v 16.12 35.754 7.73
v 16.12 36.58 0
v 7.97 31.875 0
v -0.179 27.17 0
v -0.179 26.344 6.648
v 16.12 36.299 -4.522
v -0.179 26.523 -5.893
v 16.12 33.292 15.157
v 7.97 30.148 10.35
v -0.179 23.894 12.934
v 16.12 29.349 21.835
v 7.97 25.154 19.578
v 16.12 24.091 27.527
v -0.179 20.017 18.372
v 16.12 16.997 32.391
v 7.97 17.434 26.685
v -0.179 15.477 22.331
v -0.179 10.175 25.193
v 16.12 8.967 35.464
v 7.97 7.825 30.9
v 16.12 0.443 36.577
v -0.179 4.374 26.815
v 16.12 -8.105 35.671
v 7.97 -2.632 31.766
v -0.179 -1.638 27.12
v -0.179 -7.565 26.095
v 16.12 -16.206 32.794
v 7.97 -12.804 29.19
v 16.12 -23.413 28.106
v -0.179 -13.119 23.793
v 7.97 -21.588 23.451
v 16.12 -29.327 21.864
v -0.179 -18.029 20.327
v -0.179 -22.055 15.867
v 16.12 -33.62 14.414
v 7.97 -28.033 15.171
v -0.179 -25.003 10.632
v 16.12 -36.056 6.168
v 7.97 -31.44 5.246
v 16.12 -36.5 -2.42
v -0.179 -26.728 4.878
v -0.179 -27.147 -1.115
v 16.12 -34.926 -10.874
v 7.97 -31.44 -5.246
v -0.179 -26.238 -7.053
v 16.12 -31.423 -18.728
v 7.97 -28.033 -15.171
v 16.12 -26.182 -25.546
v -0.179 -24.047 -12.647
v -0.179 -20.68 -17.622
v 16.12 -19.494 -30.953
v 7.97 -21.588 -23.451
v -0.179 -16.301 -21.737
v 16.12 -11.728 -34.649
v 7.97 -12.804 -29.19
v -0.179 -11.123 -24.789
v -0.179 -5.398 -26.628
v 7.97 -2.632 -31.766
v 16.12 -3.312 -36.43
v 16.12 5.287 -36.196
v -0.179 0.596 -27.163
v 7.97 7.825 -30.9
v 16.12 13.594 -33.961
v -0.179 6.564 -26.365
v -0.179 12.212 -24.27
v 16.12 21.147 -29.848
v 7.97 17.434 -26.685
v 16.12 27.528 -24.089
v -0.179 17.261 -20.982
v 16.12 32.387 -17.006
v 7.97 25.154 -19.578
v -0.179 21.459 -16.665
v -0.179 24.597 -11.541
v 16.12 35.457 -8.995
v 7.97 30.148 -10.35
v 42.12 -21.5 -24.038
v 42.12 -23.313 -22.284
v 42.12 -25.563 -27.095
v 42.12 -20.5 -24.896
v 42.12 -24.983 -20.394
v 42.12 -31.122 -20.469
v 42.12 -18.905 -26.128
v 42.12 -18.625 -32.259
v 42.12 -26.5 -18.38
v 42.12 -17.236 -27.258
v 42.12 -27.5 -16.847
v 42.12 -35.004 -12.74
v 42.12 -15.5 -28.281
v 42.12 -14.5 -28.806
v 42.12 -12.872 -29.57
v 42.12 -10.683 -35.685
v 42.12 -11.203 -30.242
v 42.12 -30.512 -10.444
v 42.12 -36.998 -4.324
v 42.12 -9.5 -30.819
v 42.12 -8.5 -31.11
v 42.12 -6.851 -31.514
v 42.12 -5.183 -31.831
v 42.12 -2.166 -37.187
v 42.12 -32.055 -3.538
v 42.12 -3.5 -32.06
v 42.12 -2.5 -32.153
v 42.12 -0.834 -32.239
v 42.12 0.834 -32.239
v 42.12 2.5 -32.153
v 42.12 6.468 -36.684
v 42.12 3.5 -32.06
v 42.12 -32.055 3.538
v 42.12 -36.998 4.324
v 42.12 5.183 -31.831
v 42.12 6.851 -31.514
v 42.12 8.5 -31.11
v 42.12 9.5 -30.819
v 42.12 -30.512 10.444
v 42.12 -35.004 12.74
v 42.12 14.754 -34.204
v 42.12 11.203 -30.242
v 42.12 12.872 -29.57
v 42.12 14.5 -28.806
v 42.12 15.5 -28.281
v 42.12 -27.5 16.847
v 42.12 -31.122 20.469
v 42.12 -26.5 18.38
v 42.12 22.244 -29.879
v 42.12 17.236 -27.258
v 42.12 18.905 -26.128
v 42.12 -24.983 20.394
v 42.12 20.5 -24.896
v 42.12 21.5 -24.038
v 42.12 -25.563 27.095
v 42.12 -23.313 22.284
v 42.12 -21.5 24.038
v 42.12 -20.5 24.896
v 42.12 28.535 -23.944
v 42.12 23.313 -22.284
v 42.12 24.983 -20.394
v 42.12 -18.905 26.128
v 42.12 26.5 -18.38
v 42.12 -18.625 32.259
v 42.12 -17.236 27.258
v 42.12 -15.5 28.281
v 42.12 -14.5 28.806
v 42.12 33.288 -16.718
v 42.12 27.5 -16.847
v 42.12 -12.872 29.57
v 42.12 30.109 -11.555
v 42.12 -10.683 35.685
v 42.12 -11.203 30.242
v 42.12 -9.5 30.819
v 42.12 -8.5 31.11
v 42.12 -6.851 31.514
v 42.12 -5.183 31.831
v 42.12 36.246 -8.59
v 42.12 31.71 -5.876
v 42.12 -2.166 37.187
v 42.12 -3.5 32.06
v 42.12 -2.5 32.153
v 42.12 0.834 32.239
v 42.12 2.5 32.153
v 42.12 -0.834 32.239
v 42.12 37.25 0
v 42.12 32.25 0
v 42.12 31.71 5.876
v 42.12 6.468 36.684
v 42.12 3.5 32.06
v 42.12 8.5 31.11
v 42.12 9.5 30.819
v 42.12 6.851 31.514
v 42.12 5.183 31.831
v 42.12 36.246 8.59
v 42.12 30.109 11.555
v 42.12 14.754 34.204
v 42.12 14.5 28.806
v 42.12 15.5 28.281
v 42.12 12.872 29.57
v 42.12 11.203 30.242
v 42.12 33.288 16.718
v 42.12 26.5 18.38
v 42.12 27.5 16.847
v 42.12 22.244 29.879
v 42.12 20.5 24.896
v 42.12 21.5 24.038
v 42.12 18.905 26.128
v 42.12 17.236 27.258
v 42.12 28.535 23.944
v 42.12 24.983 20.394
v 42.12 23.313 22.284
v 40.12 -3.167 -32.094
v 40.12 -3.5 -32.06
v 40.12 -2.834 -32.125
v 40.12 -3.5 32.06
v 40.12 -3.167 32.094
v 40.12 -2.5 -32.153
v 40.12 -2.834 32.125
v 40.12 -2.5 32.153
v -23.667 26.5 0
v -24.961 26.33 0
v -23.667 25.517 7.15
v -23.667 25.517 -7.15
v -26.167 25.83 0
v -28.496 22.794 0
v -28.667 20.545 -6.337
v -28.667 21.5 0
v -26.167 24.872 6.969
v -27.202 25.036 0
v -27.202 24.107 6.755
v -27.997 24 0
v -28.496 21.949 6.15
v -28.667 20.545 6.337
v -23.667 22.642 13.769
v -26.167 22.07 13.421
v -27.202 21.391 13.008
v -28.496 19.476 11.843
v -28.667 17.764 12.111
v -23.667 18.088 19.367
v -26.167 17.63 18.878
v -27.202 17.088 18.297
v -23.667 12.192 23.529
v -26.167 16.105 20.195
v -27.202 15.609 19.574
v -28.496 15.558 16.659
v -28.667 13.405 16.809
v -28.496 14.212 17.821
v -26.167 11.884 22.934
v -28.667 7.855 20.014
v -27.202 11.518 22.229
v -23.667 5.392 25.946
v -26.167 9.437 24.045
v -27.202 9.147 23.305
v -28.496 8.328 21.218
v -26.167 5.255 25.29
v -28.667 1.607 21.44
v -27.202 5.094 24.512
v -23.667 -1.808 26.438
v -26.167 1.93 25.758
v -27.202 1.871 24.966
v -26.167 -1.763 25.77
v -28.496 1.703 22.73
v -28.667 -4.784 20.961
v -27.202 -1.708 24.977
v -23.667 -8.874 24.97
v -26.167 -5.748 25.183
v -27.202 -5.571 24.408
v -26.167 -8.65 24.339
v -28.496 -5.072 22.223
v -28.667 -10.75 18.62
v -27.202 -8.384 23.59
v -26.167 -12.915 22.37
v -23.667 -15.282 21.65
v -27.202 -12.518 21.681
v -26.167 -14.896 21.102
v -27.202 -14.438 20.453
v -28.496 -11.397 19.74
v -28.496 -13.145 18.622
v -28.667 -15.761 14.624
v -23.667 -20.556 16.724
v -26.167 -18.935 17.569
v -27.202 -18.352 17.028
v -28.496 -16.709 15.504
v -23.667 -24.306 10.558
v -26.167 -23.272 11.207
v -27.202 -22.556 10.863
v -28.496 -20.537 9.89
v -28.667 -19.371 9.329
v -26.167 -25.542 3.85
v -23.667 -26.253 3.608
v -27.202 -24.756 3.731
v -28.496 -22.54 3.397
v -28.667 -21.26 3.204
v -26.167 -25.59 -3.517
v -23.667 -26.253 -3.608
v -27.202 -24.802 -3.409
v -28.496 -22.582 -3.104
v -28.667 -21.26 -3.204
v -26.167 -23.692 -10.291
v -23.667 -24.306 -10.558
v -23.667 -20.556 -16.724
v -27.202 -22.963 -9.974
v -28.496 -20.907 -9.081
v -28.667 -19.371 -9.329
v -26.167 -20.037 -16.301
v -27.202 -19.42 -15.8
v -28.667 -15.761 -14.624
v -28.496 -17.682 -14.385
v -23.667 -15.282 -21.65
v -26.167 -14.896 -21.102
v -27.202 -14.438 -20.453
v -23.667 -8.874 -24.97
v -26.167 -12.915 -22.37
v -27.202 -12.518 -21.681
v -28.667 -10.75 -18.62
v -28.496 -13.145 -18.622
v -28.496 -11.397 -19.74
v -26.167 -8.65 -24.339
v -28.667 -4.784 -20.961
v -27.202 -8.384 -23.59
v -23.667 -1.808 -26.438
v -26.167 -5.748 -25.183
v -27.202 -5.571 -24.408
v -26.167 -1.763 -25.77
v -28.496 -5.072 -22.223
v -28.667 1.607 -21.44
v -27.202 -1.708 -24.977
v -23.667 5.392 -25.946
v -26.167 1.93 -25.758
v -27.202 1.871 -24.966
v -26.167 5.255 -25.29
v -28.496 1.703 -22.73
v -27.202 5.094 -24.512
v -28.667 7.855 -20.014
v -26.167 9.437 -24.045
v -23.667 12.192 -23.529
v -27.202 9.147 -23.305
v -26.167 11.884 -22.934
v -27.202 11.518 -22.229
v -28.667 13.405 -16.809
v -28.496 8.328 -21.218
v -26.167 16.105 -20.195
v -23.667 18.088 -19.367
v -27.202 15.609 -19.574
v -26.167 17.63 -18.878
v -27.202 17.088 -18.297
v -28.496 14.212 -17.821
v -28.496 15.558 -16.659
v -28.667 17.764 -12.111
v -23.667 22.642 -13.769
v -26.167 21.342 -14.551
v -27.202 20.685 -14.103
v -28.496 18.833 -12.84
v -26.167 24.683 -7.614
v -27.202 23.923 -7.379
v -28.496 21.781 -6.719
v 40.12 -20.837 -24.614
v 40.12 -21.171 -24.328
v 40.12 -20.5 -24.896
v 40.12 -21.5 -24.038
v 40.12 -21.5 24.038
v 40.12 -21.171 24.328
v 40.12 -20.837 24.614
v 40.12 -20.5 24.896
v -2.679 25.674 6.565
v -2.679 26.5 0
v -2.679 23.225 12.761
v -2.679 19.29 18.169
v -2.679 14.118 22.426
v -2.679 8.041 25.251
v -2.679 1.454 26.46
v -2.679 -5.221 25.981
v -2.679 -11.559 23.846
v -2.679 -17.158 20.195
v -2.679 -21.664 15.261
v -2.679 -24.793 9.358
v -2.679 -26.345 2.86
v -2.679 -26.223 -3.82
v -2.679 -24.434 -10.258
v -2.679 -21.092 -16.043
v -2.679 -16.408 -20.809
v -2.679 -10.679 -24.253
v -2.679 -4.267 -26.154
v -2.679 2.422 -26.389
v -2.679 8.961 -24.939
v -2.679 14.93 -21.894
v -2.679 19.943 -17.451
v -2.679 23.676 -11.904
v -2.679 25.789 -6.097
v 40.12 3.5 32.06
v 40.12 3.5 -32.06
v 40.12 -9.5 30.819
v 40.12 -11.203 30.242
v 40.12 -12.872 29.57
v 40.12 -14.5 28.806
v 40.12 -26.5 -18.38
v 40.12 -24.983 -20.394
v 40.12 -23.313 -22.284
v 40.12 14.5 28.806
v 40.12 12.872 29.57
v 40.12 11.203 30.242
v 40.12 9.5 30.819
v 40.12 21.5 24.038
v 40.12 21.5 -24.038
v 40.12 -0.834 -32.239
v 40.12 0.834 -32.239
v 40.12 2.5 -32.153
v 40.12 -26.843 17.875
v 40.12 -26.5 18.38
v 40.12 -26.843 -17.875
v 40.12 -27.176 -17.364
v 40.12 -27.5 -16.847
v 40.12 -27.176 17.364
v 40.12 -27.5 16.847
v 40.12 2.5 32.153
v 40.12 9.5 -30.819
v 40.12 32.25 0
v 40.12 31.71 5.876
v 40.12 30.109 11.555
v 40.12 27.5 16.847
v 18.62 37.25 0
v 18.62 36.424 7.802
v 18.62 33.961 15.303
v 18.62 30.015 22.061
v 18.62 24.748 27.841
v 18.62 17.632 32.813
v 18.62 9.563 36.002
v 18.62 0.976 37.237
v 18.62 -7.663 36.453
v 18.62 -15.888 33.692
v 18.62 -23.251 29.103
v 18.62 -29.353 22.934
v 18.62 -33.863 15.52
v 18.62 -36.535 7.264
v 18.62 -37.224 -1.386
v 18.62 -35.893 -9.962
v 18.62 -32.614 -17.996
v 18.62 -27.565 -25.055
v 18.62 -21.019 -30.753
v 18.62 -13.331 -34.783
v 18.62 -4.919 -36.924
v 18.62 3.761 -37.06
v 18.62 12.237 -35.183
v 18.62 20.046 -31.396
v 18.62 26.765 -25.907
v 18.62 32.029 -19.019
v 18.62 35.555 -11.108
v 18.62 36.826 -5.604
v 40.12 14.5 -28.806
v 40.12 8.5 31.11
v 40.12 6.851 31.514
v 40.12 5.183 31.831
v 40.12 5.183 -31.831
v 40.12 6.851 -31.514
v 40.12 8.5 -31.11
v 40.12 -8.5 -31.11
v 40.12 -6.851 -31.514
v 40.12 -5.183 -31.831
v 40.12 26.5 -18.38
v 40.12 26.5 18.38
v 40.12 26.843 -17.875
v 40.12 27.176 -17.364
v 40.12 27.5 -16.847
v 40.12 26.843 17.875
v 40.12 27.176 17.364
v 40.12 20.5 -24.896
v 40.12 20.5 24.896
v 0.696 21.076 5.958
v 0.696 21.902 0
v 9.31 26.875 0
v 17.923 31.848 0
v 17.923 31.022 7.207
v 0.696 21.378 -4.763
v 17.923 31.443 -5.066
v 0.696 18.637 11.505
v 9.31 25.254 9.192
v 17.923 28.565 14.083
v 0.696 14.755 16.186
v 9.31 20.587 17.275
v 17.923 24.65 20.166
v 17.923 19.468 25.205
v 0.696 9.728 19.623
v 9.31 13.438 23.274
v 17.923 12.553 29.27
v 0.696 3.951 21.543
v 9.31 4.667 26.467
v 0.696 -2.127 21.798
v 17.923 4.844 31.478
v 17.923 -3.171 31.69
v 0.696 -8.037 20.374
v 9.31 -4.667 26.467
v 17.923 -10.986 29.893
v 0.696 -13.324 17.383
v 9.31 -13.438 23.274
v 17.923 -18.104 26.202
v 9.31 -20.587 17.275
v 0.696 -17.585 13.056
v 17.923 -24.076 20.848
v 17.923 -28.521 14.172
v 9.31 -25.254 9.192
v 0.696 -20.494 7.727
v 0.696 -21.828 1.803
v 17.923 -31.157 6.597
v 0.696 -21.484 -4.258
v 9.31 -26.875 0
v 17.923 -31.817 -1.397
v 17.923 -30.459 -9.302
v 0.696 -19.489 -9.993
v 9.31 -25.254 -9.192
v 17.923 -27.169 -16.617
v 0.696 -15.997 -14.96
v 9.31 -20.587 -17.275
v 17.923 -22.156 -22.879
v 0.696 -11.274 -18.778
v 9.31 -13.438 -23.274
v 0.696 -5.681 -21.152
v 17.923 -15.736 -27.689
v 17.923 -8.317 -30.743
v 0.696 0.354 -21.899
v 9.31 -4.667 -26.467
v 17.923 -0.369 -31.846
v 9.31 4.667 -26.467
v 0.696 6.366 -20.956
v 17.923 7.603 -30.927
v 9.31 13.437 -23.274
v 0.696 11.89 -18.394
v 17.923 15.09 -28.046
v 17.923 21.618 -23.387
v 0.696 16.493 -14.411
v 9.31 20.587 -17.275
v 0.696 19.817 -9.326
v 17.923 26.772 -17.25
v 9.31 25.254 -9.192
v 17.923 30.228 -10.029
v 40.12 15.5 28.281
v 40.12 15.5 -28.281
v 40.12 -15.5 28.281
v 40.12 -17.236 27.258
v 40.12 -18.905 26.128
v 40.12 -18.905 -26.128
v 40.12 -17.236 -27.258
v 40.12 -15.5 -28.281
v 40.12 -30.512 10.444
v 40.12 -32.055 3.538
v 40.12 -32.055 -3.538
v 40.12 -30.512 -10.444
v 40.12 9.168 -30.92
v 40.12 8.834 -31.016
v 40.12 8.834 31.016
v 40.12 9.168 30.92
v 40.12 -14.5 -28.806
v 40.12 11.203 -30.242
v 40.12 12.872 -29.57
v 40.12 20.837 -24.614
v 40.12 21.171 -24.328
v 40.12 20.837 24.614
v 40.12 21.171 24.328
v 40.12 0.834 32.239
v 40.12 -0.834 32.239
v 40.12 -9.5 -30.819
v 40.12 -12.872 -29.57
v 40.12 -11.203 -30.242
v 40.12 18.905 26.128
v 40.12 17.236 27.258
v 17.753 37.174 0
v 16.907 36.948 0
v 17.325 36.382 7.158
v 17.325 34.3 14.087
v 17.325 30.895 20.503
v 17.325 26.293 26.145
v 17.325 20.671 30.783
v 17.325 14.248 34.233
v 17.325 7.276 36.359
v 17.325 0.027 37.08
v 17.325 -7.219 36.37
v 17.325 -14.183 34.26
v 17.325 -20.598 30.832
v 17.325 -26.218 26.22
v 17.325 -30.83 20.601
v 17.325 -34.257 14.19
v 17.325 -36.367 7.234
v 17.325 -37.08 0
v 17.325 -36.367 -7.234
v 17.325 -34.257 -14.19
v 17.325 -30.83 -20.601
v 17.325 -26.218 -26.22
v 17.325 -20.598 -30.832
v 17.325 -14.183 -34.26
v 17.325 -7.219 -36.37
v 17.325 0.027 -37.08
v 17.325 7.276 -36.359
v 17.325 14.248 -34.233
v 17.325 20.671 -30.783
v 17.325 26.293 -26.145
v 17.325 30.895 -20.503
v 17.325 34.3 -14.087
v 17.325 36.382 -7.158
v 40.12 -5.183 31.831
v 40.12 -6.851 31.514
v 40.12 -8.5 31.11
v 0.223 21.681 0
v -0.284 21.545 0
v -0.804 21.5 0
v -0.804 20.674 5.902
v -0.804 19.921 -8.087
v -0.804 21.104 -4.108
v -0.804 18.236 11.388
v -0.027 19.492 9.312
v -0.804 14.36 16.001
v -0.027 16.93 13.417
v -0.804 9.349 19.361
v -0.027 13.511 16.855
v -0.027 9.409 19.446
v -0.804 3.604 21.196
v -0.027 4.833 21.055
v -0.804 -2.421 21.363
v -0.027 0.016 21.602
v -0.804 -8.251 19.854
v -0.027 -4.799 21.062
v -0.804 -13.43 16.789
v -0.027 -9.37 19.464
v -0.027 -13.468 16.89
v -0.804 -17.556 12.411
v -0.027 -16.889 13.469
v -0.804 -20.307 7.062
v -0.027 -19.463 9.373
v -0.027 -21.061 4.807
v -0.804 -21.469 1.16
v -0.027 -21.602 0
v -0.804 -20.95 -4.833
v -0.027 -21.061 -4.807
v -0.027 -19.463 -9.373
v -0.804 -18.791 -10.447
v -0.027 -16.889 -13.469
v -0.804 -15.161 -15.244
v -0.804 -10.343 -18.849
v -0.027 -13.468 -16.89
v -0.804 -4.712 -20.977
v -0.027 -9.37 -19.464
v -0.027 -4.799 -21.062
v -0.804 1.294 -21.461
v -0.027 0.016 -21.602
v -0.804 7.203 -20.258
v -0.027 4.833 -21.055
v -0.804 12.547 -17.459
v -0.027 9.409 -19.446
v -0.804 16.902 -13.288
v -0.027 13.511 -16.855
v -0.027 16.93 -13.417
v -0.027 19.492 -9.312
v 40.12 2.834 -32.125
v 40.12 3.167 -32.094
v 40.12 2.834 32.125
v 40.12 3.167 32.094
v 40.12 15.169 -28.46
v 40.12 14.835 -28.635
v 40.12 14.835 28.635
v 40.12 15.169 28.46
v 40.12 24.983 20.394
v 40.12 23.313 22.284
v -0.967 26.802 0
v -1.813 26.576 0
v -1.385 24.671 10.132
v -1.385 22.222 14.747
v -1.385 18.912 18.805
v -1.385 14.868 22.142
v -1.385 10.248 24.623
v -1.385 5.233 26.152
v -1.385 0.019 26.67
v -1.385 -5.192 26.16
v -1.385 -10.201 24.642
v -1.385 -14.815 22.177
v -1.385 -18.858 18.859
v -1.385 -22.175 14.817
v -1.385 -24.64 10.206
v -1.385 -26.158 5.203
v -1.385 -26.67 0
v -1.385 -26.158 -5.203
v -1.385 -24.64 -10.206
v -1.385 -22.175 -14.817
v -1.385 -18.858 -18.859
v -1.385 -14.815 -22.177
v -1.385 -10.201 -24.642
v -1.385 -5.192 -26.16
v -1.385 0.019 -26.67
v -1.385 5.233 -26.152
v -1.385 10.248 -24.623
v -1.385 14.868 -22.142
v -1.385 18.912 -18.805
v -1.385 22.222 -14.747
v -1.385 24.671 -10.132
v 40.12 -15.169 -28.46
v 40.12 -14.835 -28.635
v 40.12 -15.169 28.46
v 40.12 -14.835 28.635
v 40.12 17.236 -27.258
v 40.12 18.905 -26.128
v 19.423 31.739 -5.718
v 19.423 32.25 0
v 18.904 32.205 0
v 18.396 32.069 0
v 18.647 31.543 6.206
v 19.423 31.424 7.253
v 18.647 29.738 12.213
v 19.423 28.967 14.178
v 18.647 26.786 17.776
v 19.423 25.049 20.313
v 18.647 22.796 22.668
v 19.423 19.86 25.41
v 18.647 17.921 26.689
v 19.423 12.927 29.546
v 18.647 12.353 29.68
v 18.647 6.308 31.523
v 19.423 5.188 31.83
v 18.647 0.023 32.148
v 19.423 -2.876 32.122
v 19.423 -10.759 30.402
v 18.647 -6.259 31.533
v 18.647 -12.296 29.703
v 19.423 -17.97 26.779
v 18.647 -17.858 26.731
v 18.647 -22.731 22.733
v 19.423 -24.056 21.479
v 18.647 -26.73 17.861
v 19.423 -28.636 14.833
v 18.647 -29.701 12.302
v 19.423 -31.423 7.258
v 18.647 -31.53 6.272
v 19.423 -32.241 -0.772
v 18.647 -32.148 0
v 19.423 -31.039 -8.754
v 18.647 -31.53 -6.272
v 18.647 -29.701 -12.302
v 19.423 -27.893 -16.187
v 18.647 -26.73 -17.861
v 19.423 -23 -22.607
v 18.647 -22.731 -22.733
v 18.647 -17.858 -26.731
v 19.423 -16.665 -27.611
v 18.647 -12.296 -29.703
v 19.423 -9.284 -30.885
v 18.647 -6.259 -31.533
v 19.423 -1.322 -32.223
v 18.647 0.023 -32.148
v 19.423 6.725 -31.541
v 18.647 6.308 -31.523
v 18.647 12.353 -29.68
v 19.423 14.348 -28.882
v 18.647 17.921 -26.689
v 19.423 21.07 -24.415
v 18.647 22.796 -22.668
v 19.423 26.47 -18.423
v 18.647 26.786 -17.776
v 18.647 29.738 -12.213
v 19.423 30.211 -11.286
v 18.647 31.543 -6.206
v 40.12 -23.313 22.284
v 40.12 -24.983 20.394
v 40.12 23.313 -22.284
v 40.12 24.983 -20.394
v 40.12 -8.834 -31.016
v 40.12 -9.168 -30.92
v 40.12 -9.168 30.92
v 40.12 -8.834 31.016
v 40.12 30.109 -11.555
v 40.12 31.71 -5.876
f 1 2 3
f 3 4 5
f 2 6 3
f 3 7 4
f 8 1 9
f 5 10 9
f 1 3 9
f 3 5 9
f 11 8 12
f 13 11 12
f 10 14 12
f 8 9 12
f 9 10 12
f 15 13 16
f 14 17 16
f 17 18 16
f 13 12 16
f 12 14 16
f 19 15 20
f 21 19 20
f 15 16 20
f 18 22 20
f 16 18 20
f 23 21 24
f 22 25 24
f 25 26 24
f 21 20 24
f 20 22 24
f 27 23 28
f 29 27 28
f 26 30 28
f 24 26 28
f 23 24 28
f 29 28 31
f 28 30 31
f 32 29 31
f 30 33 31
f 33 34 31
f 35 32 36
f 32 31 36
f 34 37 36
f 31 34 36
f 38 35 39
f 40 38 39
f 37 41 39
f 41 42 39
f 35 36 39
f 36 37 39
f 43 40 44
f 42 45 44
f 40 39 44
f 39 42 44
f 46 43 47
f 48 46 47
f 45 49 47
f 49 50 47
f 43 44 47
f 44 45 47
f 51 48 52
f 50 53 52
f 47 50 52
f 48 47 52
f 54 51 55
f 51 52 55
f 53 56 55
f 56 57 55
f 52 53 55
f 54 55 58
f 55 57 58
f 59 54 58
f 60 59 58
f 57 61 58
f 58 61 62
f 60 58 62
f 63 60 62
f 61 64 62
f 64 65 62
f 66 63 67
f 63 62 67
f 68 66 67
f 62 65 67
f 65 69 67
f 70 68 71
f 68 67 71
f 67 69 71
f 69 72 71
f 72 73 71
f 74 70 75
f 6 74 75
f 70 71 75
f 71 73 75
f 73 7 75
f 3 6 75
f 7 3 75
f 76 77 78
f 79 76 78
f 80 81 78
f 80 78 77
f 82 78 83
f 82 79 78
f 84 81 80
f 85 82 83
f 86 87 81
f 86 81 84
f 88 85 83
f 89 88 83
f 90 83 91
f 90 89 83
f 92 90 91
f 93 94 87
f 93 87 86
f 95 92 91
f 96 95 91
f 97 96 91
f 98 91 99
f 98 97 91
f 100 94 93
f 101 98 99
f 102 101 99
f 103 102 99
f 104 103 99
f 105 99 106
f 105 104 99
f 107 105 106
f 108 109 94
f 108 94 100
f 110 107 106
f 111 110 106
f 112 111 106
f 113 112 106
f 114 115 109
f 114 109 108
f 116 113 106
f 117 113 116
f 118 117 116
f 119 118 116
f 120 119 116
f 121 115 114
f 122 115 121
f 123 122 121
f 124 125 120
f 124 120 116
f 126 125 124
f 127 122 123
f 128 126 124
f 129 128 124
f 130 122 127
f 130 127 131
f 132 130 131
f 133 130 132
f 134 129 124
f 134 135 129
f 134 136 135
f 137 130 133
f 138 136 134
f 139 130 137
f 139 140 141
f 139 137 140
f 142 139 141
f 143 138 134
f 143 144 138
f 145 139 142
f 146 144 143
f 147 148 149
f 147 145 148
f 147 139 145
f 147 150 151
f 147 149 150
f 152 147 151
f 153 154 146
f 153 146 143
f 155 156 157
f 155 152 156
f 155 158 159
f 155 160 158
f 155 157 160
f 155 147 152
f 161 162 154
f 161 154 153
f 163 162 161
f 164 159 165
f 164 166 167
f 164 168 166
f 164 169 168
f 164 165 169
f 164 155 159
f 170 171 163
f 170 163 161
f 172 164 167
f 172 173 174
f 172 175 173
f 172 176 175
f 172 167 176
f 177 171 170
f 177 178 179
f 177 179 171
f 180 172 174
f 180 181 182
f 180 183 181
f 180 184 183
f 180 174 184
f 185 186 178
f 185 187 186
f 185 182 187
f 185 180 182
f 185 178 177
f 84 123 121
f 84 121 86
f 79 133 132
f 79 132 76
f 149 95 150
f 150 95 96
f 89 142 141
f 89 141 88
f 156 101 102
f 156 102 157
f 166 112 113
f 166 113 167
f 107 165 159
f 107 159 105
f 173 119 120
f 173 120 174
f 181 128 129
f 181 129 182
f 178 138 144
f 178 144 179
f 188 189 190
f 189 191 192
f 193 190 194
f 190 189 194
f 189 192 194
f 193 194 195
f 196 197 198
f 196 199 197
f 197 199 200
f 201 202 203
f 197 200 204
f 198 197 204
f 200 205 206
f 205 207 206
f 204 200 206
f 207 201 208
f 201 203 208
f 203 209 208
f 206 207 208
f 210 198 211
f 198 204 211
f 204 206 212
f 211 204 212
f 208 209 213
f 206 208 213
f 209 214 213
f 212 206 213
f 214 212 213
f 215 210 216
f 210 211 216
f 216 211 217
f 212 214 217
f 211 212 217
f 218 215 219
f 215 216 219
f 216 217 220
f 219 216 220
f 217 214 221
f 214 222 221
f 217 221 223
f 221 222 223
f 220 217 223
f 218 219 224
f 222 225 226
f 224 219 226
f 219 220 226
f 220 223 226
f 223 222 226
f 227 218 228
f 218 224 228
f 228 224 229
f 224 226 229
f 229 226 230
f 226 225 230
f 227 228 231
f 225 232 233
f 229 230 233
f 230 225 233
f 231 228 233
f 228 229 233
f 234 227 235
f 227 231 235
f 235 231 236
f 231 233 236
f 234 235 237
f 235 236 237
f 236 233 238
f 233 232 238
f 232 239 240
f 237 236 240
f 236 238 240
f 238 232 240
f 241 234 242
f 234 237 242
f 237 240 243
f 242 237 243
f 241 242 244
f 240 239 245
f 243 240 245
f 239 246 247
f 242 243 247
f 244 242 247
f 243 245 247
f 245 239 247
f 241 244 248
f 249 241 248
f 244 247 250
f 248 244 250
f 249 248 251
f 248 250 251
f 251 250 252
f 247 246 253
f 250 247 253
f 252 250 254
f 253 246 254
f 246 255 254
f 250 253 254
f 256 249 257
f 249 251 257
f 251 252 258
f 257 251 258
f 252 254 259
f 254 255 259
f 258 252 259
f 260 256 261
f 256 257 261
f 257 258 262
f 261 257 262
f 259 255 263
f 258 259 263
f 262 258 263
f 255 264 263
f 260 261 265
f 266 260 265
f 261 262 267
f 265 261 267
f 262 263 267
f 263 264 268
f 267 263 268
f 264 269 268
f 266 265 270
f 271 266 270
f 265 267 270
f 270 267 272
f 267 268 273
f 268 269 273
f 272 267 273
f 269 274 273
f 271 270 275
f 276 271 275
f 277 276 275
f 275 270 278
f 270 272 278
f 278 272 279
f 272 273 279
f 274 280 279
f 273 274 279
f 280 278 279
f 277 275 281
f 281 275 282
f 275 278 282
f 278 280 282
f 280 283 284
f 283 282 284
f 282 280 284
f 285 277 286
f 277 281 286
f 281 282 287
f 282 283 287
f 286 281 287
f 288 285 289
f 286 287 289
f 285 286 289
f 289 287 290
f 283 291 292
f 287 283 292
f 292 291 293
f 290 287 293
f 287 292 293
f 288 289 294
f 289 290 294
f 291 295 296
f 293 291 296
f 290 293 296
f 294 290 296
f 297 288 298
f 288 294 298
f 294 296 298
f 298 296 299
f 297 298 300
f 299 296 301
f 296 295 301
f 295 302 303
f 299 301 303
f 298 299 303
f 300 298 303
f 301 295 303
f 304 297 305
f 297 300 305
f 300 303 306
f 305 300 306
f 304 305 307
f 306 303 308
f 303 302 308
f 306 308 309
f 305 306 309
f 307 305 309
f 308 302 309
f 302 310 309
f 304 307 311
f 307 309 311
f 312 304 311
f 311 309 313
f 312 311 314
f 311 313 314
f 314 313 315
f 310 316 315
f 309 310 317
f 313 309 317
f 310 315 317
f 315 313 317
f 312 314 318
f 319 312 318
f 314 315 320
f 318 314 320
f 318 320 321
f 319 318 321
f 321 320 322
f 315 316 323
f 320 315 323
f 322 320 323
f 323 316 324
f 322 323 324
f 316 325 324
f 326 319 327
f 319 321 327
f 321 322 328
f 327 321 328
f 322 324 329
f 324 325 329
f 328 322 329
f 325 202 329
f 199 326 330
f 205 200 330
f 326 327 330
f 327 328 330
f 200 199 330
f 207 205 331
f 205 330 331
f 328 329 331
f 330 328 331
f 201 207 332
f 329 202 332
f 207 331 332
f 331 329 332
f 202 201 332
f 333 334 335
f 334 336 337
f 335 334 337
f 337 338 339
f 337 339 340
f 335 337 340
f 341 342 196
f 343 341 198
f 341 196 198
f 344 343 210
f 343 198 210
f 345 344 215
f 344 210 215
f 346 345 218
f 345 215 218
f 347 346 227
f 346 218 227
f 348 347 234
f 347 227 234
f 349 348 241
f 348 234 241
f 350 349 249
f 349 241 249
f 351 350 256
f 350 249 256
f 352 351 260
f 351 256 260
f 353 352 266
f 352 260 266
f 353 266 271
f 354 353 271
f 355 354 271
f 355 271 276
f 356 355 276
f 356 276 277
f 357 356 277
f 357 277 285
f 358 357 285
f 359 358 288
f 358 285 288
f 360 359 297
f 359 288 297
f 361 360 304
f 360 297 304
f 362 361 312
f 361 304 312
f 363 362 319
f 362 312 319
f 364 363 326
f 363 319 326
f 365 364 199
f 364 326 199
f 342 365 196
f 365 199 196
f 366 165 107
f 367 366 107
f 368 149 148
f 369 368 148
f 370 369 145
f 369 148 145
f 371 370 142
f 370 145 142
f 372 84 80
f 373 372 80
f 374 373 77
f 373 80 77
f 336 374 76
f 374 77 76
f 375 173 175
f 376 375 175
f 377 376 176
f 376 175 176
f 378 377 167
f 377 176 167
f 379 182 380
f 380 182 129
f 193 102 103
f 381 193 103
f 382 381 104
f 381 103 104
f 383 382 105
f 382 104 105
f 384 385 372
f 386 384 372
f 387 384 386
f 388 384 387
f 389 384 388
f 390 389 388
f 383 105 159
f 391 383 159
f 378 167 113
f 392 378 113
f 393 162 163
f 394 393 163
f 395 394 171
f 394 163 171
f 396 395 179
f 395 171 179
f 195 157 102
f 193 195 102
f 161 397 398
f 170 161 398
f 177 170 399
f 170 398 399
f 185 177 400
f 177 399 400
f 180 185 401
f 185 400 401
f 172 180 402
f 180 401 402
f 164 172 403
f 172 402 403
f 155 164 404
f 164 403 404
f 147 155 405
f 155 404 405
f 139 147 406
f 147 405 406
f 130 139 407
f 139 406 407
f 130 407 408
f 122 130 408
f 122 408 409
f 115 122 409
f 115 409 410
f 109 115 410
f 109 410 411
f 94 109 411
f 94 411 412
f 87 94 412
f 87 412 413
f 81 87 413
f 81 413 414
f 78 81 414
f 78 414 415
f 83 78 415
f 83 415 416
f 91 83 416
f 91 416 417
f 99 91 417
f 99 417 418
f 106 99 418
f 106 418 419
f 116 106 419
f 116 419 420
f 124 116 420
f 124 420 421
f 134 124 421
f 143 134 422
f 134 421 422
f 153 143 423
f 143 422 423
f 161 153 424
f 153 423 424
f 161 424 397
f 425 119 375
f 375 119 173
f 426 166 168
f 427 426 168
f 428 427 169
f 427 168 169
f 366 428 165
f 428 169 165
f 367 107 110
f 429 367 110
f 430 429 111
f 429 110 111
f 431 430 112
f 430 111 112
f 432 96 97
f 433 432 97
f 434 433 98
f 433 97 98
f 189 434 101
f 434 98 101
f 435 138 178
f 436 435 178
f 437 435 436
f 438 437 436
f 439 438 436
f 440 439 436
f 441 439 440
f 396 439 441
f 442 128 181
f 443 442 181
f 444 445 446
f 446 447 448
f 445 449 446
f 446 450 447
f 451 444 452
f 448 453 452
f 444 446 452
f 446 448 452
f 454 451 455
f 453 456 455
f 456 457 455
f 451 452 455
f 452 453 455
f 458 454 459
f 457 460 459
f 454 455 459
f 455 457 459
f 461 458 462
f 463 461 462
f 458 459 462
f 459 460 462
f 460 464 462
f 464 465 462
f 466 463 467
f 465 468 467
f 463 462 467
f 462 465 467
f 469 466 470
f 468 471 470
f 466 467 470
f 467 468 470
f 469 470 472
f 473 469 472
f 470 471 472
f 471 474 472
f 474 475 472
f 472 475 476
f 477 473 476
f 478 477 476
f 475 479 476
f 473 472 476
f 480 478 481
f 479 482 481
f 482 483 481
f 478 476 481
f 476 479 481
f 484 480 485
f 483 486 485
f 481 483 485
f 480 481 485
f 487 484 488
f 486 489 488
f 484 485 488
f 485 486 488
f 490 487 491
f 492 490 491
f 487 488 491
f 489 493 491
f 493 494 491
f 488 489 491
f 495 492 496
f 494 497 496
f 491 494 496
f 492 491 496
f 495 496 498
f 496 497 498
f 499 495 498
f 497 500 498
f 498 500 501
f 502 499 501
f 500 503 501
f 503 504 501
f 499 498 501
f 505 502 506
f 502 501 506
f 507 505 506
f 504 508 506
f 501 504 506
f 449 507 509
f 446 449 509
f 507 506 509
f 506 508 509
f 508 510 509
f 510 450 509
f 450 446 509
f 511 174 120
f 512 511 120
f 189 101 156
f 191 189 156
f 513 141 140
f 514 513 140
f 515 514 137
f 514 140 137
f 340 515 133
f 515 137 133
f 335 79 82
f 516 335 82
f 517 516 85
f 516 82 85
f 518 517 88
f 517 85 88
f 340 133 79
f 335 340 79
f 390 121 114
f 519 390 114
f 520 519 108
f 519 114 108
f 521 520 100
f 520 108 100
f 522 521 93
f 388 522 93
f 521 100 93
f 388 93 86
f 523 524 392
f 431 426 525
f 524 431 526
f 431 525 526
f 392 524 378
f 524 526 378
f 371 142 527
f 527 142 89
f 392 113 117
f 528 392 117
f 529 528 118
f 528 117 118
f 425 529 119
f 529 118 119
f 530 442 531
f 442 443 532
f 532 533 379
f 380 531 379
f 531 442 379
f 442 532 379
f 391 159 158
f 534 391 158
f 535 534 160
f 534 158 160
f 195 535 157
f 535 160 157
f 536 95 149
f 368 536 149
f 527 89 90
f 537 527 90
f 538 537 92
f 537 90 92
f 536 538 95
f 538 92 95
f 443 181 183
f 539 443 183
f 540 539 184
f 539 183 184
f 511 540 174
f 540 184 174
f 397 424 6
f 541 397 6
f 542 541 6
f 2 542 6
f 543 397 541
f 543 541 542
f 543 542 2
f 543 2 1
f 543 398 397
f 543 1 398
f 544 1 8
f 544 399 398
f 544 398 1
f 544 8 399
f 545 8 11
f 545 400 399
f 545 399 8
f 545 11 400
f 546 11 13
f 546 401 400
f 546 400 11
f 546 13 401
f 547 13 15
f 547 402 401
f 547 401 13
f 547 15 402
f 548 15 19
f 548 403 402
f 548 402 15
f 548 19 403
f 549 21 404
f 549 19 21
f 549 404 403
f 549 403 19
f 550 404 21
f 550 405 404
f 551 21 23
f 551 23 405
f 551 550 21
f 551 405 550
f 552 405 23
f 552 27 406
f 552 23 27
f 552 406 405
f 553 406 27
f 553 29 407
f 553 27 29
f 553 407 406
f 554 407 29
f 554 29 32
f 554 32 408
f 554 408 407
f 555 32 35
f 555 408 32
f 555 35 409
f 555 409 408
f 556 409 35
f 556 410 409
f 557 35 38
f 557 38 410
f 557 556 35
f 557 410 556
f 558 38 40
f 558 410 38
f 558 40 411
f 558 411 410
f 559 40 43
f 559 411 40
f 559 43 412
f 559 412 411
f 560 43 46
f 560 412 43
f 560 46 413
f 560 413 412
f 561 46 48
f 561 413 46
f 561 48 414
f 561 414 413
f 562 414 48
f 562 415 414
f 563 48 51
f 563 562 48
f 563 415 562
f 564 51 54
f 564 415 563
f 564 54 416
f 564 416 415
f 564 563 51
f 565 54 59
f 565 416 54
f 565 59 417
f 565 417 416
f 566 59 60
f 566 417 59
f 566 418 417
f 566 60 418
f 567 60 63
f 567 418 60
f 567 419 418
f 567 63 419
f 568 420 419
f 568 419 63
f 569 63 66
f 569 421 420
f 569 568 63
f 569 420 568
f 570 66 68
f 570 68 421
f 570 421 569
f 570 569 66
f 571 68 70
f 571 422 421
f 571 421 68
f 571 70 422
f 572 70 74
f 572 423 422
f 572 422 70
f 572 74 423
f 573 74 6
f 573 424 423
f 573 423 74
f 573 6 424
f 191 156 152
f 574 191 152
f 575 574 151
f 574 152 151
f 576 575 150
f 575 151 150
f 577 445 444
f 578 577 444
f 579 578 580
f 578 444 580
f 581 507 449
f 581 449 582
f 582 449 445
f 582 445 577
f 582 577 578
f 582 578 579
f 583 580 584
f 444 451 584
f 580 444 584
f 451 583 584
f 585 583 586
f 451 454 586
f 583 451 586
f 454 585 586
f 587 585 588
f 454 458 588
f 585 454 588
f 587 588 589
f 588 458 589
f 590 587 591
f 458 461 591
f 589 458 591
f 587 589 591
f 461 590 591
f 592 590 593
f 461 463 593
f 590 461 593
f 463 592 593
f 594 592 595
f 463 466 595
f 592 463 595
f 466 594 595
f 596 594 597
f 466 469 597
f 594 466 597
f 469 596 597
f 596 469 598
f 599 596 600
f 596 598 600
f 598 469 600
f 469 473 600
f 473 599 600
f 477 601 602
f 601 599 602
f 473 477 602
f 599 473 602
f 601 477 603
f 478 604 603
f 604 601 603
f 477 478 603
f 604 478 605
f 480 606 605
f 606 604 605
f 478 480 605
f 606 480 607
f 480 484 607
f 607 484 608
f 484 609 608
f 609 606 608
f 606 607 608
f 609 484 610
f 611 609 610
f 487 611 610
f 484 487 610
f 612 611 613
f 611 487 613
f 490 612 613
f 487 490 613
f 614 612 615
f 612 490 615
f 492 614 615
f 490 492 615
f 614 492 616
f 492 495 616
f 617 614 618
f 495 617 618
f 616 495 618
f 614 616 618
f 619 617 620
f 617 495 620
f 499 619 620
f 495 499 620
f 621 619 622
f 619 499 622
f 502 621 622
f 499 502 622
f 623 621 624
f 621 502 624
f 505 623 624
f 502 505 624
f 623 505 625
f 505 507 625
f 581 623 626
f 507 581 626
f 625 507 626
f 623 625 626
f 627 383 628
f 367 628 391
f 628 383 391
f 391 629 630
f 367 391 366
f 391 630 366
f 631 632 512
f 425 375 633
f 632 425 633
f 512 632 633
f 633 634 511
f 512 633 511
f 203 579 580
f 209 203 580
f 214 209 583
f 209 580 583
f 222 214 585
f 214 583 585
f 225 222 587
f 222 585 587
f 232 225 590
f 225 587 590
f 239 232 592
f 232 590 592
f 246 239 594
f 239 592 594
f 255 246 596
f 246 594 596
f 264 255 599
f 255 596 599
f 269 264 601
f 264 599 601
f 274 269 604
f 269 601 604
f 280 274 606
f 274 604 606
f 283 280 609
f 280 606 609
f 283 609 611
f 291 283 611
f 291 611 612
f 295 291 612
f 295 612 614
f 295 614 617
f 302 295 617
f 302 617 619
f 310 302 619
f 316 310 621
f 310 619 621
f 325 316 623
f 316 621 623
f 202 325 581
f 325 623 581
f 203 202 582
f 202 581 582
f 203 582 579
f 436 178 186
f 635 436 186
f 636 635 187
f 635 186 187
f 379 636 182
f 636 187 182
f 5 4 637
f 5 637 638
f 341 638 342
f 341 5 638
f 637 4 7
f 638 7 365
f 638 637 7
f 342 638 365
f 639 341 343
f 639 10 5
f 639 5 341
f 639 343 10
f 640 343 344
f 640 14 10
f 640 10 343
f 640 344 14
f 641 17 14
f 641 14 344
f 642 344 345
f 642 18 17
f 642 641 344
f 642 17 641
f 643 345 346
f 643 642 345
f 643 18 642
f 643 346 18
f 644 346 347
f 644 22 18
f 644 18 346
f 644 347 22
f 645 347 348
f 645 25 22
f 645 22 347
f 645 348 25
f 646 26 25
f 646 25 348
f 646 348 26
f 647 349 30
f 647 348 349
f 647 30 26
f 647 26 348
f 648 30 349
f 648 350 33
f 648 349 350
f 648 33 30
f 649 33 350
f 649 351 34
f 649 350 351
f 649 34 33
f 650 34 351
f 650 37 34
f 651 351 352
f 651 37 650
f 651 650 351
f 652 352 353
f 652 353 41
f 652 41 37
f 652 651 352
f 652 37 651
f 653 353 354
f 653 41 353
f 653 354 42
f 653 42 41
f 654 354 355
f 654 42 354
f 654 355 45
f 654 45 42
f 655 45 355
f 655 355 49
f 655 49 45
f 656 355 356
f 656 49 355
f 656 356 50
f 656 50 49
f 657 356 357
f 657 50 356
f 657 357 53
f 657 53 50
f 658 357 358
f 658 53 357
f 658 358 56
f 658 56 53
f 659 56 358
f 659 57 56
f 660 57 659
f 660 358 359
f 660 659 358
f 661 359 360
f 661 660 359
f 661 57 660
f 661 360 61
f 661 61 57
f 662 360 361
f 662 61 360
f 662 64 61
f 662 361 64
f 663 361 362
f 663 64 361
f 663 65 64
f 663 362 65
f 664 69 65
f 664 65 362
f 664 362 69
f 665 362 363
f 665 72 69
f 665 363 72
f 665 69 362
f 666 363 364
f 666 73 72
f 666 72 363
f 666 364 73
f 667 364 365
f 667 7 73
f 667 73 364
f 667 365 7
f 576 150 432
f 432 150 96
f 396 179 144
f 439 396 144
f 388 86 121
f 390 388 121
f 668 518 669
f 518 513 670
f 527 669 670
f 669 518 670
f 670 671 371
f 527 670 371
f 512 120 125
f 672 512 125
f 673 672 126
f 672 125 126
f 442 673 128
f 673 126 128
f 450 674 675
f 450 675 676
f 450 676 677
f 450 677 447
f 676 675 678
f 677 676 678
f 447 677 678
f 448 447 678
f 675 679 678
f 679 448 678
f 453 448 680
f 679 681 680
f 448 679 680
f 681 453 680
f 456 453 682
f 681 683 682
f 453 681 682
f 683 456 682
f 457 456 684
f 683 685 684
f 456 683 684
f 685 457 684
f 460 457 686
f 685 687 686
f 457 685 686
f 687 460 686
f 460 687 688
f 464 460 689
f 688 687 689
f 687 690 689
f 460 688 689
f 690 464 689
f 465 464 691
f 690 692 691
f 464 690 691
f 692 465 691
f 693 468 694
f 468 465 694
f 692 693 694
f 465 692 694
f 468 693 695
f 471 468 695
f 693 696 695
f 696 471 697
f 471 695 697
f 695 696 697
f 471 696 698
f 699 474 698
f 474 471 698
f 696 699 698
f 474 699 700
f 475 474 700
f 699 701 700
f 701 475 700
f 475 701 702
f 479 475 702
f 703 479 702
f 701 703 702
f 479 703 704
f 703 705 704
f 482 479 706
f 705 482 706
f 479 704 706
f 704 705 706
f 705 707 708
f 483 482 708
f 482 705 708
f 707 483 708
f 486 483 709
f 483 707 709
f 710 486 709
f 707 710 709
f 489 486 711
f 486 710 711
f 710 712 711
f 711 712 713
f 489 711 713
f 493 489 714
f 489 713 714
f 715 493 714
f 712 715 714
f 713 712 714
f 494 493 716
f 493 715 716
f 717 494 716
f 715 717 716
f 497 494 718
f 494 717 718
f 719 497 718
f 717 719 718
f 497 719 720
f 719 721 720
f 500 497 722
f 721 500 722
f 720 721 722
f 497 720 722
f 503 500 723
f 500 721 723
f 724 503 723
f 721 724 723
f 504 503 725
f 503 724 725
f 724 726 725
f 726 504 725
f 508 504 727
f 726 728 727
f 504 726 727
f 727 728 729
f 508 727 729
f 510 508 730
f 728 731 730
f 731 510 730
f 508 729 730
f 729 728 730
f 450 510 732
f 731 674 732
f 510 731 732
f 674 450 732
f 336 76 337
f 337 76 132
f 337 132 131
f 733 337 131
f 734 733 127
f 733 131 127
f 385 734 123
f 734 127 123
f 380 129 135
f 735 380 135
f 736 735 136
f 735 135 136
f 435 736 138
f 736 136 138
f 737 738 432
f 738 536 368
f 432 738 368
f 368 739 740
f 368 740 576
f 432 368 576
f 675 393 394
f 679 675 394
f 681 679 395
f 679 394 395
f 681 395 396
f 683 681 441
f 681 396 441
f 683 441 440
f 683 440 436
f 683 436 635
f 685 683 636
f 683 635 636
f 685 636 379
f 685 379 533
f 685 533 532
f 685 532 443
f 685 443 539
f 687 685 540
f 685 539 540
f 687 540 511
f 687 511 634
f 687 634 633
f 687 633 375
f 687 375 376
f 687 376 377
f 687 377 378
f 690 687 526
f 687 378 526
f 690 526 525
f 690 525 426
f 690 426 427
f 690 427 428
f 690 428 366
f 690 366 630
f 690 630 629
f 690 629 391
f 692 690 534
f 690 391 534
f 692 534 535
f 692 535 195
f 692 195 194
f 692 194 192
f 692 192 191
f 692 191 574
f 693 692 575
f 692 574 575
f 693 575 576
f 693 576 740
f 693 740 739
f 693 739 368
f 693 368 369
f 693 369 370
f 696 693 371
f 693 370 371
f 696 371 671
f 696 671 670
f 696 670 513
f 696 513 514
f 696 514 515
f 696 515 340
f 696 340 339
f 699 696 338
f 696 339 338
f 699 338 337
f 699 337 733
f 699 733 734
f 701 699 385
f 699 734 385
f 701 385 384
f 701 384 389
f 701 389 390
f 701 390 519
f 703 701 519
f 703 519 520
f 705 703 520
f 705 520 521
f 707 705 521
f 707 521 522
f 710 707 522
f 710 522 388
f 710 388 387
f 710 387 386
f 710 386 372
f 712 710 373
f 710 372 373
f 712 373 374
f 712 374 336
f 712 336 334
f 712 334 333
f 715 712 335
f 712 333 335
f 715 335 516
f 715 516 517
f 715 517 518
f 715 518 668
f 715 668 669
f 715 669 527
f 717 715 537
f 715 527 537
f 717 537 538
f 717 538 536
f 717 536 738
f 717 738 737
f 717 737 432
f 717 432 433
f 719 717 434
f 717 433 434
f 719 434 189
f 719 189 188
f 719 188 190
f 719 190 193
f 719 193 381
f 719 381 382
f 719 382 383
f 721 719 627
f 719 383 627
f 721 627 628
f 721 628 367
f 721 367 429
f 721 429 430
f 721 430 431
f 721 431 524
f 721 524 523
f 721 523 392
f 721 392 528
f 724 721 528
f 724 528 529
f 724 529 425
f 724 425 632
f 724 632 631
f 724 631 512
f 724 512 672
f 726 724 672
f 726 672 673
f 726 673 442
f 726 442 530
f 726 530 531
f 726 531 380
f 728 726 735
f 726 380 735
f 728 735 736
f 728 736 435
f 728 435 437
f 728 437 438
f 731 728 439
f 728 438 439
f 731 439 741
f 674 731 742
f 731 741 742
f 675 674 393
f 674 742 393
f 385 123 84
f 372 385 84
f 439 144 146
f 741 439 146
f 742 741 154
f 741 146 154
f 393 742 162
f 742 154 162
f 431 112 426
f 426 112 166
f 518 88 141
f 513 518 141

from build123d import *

# Parameters (mm, degrees)
F2_R     = 37.25
F3_DEPTH = 2
F5_DEPTH = 2
F6_R     = 4.99999
F7_R     = 3


# Not quite as in the source:
# - a fillet or chamfer is up to 0.001 mm smaller than in the source, because OpenCascade refuses the exact size


with BuildPart() as f1:
    # F0 (on Top) → F1 (revolve)
    with BuildSketch(Plane.XY):
        Polygon((-28.6666666667, 26.5), (-28.6666666667, 21.5), (0, 21.5), (18.6195461814, 32.25), (40.1195461814, 32.25), (40.1195461814, 37.25), (17.2798002192, 37.25), (-1.3397459622, 26.5), align=None)
    revolve(axis=Axis((-8.7595172226, 0, 0), (1, 0, 0)))

    # F2 (on face) → F3 (join)
    with BuildSketch(Plane.YZ.offset(40.1195461814)):
        Circle(F2_R)
    extrude(amount=F3_DEPTH)

    # F4 (on face) → F5 (cut, through all)
    with BuildSketch(Plane.YZ.offset(42.1195461814)):
        with BuildLine():
            ThreePointArc((32.25, 0), (31.0397930083, 8.7517855321), (27.5, 16.8467355888))
            Line((27.5, 16.8467355888), (27.5, -16.8467355888))
            ThreePointArc((27.5, -16.8467355888), (31.0397930083, -8.7517855321), (32.25, 0))
        make_face()
        with BuildLine():
            ThreePointArc((26.5, 18.3796762757), (24.1661621929, 21.3555403788), (21.5, 24.0377307581))
            Line((21.5, 24.0377307581), (21.5, -24.0377307581))
            ThreePointArc((21.5, -24.0377307581), (24.1661621929, -21.3555403788), (26.5, -18.3796762757))
            Line((26.5, -18.3796762757), (26.5, 18.3796762757))
        make_face()
        with BuildLine():
            ThreePointArc((20.5, 24.8960338207), (18.0793922843, 26.7057685647), (15.5, 28.2809564902))
            Line((15.5, 28.2809564902), (15.5, -28.2809564902))
            ThreePointArc((15.5, -28.2809564902), (18.0793922843, -26.7057685647), (20.5, -24.8960338207))
            Line((20.5, -24.8960338207), (20.5, 24.8960338207))
        make_face()
        with BuildLine():
            ThreePointArc((14.5, 28.806466288), (12.0421178111, 29.9173845552), (9.5, 30.8190282131))
            Line((9.5, 30.8190282131), (9.5, -30.8190282131))
            ThreePointArc((9.5, -30.8190282131), (12.0421178111, -29.9173845552), (14.5, -28.806466288))
            Line((14.5, -28.806466288), (14.5, 28.806466288))
        make_face()
        with BuildLine():
            ThreePointArc((8.5, 31.1096849872), (6.0187660071, 31.6833861156), (3.5, 32.0595149683))
            Line((3.5, 32.0595149683), (3.5, -32.0595149683))
            ThreePointArc((3.5, -32.0595149683), (6.0187660071, -31.6833861156), (8.5, -31.1096849872))
            Line((8.5, -31.1096849872), (8.5, 31.1096849872))
        make_face()
        with BuildLine():
            ThreePointArc((2.5, 32.1529547631), (0, 32.25), (-2.5, 32.1529547631))
            Line((-2.5, 32.1529547631), (-2.5, -32.1529547631))
            ThreePointArc((-2.5, -32.1529547631), (0, -32.25), (2.5, -32.1529547631))
            Line((2.5, -32.1529547631), (2.5, 32.1529547631))
        make_face()
        with BuildLine():
            Line((-3.5, -32.0595149683), (-3.5, 32.0595149683))
            ThreePointArc((-3.5, 32.0595149683), (-6.0187660071, 31.6833861156), (-8.5, 31.1096849872))
            Line((-8.5, 31.1096849872), (-8.5, -31.1096849872))
            ThreePointArc((-8.5, -31.1096849872), (-6.0187660071, -31.6833861156), (-3.5, -32.0595149683))
        make_face()
        with BuildLine():
            Line((-9.5, -30.8190282131), (-9.5, 30.8190282131))
            ThreePointArc((-9.5, 30.8190282131), (-12.0421178111, 29.9173845552), (-14.5, 28.806466288))
            Line((-14.5, 28.806466288), (-14.5, -28.806466288))
            ThreePointArc((-14.5, -28.806466288), (-12.0421178111, -29.9173845552), (-9.5, -30.8190282131))
        make_face()
        with BuildLine():
            Line((-15.5, -28.2809564902), (-15.5, 28.2809564902))
            ThreePointArc((-15.5, 28.2809564902), (-18.0793922843, 26.7057685647), (-20.5, 24.8960338207))
            Line((-20.5, 24.8960338207), (-20.5, -24.8960338207))
            ThreePointArc((-20.5, -24.8960338207), (-18.0793922843, -26.7057685647), (-15.5, -28.2809564902))
        make_face()
        with BuildLine():
            Line((-21.5, -24.0377307581), (-21.5, 24.0377307581))
            ThreePointArc((-21.5, 24.0377307581), (-24.1661621929, 21.3555403788), (-26.5, 18.3796762757))
            Line((-26.5, 18.3796762757), (-26.5, -18.3796762757))
            ThreePointArc((-26.5, -18.3796762757), (-24.1661621929, -21.3555403788), (-21.5, -24.0377307581))
        make_face()
        with BuildLine():
            Line((-27.5, -16.8467355888), (-27.5, 16.8467355888))
            ThreePointArc((-27.5, 16.8467355888), (-32.25, 0), (-27.5, -16.8467355888))
        make_face()
    extrude(amount=-F5_DEPTH, mode=Mode.SUBTRACT)

    # F6 (radius 5 in the source; OpenCascade refuses exactly that, so slightly less here)
    f6_edges = [f1.edges().sort_by_distance(p)[0] for p in [
        (-28.666667, -26.5, 0),
        (-1.339746, -26.5, 0),
        (17.2798, -37.25, 0),
    ]]
    fillet(f6_edges, radius=F6_R)

    # F7
    f7_edges = [f1.edges().sort_by_distance(p)[0] for p in [
        (18.619546, -32.25, 0),
        (0, -21.5, 0),
    ]]
    fillet(f7_edges, radius=F7_R)


solid = f1.part
